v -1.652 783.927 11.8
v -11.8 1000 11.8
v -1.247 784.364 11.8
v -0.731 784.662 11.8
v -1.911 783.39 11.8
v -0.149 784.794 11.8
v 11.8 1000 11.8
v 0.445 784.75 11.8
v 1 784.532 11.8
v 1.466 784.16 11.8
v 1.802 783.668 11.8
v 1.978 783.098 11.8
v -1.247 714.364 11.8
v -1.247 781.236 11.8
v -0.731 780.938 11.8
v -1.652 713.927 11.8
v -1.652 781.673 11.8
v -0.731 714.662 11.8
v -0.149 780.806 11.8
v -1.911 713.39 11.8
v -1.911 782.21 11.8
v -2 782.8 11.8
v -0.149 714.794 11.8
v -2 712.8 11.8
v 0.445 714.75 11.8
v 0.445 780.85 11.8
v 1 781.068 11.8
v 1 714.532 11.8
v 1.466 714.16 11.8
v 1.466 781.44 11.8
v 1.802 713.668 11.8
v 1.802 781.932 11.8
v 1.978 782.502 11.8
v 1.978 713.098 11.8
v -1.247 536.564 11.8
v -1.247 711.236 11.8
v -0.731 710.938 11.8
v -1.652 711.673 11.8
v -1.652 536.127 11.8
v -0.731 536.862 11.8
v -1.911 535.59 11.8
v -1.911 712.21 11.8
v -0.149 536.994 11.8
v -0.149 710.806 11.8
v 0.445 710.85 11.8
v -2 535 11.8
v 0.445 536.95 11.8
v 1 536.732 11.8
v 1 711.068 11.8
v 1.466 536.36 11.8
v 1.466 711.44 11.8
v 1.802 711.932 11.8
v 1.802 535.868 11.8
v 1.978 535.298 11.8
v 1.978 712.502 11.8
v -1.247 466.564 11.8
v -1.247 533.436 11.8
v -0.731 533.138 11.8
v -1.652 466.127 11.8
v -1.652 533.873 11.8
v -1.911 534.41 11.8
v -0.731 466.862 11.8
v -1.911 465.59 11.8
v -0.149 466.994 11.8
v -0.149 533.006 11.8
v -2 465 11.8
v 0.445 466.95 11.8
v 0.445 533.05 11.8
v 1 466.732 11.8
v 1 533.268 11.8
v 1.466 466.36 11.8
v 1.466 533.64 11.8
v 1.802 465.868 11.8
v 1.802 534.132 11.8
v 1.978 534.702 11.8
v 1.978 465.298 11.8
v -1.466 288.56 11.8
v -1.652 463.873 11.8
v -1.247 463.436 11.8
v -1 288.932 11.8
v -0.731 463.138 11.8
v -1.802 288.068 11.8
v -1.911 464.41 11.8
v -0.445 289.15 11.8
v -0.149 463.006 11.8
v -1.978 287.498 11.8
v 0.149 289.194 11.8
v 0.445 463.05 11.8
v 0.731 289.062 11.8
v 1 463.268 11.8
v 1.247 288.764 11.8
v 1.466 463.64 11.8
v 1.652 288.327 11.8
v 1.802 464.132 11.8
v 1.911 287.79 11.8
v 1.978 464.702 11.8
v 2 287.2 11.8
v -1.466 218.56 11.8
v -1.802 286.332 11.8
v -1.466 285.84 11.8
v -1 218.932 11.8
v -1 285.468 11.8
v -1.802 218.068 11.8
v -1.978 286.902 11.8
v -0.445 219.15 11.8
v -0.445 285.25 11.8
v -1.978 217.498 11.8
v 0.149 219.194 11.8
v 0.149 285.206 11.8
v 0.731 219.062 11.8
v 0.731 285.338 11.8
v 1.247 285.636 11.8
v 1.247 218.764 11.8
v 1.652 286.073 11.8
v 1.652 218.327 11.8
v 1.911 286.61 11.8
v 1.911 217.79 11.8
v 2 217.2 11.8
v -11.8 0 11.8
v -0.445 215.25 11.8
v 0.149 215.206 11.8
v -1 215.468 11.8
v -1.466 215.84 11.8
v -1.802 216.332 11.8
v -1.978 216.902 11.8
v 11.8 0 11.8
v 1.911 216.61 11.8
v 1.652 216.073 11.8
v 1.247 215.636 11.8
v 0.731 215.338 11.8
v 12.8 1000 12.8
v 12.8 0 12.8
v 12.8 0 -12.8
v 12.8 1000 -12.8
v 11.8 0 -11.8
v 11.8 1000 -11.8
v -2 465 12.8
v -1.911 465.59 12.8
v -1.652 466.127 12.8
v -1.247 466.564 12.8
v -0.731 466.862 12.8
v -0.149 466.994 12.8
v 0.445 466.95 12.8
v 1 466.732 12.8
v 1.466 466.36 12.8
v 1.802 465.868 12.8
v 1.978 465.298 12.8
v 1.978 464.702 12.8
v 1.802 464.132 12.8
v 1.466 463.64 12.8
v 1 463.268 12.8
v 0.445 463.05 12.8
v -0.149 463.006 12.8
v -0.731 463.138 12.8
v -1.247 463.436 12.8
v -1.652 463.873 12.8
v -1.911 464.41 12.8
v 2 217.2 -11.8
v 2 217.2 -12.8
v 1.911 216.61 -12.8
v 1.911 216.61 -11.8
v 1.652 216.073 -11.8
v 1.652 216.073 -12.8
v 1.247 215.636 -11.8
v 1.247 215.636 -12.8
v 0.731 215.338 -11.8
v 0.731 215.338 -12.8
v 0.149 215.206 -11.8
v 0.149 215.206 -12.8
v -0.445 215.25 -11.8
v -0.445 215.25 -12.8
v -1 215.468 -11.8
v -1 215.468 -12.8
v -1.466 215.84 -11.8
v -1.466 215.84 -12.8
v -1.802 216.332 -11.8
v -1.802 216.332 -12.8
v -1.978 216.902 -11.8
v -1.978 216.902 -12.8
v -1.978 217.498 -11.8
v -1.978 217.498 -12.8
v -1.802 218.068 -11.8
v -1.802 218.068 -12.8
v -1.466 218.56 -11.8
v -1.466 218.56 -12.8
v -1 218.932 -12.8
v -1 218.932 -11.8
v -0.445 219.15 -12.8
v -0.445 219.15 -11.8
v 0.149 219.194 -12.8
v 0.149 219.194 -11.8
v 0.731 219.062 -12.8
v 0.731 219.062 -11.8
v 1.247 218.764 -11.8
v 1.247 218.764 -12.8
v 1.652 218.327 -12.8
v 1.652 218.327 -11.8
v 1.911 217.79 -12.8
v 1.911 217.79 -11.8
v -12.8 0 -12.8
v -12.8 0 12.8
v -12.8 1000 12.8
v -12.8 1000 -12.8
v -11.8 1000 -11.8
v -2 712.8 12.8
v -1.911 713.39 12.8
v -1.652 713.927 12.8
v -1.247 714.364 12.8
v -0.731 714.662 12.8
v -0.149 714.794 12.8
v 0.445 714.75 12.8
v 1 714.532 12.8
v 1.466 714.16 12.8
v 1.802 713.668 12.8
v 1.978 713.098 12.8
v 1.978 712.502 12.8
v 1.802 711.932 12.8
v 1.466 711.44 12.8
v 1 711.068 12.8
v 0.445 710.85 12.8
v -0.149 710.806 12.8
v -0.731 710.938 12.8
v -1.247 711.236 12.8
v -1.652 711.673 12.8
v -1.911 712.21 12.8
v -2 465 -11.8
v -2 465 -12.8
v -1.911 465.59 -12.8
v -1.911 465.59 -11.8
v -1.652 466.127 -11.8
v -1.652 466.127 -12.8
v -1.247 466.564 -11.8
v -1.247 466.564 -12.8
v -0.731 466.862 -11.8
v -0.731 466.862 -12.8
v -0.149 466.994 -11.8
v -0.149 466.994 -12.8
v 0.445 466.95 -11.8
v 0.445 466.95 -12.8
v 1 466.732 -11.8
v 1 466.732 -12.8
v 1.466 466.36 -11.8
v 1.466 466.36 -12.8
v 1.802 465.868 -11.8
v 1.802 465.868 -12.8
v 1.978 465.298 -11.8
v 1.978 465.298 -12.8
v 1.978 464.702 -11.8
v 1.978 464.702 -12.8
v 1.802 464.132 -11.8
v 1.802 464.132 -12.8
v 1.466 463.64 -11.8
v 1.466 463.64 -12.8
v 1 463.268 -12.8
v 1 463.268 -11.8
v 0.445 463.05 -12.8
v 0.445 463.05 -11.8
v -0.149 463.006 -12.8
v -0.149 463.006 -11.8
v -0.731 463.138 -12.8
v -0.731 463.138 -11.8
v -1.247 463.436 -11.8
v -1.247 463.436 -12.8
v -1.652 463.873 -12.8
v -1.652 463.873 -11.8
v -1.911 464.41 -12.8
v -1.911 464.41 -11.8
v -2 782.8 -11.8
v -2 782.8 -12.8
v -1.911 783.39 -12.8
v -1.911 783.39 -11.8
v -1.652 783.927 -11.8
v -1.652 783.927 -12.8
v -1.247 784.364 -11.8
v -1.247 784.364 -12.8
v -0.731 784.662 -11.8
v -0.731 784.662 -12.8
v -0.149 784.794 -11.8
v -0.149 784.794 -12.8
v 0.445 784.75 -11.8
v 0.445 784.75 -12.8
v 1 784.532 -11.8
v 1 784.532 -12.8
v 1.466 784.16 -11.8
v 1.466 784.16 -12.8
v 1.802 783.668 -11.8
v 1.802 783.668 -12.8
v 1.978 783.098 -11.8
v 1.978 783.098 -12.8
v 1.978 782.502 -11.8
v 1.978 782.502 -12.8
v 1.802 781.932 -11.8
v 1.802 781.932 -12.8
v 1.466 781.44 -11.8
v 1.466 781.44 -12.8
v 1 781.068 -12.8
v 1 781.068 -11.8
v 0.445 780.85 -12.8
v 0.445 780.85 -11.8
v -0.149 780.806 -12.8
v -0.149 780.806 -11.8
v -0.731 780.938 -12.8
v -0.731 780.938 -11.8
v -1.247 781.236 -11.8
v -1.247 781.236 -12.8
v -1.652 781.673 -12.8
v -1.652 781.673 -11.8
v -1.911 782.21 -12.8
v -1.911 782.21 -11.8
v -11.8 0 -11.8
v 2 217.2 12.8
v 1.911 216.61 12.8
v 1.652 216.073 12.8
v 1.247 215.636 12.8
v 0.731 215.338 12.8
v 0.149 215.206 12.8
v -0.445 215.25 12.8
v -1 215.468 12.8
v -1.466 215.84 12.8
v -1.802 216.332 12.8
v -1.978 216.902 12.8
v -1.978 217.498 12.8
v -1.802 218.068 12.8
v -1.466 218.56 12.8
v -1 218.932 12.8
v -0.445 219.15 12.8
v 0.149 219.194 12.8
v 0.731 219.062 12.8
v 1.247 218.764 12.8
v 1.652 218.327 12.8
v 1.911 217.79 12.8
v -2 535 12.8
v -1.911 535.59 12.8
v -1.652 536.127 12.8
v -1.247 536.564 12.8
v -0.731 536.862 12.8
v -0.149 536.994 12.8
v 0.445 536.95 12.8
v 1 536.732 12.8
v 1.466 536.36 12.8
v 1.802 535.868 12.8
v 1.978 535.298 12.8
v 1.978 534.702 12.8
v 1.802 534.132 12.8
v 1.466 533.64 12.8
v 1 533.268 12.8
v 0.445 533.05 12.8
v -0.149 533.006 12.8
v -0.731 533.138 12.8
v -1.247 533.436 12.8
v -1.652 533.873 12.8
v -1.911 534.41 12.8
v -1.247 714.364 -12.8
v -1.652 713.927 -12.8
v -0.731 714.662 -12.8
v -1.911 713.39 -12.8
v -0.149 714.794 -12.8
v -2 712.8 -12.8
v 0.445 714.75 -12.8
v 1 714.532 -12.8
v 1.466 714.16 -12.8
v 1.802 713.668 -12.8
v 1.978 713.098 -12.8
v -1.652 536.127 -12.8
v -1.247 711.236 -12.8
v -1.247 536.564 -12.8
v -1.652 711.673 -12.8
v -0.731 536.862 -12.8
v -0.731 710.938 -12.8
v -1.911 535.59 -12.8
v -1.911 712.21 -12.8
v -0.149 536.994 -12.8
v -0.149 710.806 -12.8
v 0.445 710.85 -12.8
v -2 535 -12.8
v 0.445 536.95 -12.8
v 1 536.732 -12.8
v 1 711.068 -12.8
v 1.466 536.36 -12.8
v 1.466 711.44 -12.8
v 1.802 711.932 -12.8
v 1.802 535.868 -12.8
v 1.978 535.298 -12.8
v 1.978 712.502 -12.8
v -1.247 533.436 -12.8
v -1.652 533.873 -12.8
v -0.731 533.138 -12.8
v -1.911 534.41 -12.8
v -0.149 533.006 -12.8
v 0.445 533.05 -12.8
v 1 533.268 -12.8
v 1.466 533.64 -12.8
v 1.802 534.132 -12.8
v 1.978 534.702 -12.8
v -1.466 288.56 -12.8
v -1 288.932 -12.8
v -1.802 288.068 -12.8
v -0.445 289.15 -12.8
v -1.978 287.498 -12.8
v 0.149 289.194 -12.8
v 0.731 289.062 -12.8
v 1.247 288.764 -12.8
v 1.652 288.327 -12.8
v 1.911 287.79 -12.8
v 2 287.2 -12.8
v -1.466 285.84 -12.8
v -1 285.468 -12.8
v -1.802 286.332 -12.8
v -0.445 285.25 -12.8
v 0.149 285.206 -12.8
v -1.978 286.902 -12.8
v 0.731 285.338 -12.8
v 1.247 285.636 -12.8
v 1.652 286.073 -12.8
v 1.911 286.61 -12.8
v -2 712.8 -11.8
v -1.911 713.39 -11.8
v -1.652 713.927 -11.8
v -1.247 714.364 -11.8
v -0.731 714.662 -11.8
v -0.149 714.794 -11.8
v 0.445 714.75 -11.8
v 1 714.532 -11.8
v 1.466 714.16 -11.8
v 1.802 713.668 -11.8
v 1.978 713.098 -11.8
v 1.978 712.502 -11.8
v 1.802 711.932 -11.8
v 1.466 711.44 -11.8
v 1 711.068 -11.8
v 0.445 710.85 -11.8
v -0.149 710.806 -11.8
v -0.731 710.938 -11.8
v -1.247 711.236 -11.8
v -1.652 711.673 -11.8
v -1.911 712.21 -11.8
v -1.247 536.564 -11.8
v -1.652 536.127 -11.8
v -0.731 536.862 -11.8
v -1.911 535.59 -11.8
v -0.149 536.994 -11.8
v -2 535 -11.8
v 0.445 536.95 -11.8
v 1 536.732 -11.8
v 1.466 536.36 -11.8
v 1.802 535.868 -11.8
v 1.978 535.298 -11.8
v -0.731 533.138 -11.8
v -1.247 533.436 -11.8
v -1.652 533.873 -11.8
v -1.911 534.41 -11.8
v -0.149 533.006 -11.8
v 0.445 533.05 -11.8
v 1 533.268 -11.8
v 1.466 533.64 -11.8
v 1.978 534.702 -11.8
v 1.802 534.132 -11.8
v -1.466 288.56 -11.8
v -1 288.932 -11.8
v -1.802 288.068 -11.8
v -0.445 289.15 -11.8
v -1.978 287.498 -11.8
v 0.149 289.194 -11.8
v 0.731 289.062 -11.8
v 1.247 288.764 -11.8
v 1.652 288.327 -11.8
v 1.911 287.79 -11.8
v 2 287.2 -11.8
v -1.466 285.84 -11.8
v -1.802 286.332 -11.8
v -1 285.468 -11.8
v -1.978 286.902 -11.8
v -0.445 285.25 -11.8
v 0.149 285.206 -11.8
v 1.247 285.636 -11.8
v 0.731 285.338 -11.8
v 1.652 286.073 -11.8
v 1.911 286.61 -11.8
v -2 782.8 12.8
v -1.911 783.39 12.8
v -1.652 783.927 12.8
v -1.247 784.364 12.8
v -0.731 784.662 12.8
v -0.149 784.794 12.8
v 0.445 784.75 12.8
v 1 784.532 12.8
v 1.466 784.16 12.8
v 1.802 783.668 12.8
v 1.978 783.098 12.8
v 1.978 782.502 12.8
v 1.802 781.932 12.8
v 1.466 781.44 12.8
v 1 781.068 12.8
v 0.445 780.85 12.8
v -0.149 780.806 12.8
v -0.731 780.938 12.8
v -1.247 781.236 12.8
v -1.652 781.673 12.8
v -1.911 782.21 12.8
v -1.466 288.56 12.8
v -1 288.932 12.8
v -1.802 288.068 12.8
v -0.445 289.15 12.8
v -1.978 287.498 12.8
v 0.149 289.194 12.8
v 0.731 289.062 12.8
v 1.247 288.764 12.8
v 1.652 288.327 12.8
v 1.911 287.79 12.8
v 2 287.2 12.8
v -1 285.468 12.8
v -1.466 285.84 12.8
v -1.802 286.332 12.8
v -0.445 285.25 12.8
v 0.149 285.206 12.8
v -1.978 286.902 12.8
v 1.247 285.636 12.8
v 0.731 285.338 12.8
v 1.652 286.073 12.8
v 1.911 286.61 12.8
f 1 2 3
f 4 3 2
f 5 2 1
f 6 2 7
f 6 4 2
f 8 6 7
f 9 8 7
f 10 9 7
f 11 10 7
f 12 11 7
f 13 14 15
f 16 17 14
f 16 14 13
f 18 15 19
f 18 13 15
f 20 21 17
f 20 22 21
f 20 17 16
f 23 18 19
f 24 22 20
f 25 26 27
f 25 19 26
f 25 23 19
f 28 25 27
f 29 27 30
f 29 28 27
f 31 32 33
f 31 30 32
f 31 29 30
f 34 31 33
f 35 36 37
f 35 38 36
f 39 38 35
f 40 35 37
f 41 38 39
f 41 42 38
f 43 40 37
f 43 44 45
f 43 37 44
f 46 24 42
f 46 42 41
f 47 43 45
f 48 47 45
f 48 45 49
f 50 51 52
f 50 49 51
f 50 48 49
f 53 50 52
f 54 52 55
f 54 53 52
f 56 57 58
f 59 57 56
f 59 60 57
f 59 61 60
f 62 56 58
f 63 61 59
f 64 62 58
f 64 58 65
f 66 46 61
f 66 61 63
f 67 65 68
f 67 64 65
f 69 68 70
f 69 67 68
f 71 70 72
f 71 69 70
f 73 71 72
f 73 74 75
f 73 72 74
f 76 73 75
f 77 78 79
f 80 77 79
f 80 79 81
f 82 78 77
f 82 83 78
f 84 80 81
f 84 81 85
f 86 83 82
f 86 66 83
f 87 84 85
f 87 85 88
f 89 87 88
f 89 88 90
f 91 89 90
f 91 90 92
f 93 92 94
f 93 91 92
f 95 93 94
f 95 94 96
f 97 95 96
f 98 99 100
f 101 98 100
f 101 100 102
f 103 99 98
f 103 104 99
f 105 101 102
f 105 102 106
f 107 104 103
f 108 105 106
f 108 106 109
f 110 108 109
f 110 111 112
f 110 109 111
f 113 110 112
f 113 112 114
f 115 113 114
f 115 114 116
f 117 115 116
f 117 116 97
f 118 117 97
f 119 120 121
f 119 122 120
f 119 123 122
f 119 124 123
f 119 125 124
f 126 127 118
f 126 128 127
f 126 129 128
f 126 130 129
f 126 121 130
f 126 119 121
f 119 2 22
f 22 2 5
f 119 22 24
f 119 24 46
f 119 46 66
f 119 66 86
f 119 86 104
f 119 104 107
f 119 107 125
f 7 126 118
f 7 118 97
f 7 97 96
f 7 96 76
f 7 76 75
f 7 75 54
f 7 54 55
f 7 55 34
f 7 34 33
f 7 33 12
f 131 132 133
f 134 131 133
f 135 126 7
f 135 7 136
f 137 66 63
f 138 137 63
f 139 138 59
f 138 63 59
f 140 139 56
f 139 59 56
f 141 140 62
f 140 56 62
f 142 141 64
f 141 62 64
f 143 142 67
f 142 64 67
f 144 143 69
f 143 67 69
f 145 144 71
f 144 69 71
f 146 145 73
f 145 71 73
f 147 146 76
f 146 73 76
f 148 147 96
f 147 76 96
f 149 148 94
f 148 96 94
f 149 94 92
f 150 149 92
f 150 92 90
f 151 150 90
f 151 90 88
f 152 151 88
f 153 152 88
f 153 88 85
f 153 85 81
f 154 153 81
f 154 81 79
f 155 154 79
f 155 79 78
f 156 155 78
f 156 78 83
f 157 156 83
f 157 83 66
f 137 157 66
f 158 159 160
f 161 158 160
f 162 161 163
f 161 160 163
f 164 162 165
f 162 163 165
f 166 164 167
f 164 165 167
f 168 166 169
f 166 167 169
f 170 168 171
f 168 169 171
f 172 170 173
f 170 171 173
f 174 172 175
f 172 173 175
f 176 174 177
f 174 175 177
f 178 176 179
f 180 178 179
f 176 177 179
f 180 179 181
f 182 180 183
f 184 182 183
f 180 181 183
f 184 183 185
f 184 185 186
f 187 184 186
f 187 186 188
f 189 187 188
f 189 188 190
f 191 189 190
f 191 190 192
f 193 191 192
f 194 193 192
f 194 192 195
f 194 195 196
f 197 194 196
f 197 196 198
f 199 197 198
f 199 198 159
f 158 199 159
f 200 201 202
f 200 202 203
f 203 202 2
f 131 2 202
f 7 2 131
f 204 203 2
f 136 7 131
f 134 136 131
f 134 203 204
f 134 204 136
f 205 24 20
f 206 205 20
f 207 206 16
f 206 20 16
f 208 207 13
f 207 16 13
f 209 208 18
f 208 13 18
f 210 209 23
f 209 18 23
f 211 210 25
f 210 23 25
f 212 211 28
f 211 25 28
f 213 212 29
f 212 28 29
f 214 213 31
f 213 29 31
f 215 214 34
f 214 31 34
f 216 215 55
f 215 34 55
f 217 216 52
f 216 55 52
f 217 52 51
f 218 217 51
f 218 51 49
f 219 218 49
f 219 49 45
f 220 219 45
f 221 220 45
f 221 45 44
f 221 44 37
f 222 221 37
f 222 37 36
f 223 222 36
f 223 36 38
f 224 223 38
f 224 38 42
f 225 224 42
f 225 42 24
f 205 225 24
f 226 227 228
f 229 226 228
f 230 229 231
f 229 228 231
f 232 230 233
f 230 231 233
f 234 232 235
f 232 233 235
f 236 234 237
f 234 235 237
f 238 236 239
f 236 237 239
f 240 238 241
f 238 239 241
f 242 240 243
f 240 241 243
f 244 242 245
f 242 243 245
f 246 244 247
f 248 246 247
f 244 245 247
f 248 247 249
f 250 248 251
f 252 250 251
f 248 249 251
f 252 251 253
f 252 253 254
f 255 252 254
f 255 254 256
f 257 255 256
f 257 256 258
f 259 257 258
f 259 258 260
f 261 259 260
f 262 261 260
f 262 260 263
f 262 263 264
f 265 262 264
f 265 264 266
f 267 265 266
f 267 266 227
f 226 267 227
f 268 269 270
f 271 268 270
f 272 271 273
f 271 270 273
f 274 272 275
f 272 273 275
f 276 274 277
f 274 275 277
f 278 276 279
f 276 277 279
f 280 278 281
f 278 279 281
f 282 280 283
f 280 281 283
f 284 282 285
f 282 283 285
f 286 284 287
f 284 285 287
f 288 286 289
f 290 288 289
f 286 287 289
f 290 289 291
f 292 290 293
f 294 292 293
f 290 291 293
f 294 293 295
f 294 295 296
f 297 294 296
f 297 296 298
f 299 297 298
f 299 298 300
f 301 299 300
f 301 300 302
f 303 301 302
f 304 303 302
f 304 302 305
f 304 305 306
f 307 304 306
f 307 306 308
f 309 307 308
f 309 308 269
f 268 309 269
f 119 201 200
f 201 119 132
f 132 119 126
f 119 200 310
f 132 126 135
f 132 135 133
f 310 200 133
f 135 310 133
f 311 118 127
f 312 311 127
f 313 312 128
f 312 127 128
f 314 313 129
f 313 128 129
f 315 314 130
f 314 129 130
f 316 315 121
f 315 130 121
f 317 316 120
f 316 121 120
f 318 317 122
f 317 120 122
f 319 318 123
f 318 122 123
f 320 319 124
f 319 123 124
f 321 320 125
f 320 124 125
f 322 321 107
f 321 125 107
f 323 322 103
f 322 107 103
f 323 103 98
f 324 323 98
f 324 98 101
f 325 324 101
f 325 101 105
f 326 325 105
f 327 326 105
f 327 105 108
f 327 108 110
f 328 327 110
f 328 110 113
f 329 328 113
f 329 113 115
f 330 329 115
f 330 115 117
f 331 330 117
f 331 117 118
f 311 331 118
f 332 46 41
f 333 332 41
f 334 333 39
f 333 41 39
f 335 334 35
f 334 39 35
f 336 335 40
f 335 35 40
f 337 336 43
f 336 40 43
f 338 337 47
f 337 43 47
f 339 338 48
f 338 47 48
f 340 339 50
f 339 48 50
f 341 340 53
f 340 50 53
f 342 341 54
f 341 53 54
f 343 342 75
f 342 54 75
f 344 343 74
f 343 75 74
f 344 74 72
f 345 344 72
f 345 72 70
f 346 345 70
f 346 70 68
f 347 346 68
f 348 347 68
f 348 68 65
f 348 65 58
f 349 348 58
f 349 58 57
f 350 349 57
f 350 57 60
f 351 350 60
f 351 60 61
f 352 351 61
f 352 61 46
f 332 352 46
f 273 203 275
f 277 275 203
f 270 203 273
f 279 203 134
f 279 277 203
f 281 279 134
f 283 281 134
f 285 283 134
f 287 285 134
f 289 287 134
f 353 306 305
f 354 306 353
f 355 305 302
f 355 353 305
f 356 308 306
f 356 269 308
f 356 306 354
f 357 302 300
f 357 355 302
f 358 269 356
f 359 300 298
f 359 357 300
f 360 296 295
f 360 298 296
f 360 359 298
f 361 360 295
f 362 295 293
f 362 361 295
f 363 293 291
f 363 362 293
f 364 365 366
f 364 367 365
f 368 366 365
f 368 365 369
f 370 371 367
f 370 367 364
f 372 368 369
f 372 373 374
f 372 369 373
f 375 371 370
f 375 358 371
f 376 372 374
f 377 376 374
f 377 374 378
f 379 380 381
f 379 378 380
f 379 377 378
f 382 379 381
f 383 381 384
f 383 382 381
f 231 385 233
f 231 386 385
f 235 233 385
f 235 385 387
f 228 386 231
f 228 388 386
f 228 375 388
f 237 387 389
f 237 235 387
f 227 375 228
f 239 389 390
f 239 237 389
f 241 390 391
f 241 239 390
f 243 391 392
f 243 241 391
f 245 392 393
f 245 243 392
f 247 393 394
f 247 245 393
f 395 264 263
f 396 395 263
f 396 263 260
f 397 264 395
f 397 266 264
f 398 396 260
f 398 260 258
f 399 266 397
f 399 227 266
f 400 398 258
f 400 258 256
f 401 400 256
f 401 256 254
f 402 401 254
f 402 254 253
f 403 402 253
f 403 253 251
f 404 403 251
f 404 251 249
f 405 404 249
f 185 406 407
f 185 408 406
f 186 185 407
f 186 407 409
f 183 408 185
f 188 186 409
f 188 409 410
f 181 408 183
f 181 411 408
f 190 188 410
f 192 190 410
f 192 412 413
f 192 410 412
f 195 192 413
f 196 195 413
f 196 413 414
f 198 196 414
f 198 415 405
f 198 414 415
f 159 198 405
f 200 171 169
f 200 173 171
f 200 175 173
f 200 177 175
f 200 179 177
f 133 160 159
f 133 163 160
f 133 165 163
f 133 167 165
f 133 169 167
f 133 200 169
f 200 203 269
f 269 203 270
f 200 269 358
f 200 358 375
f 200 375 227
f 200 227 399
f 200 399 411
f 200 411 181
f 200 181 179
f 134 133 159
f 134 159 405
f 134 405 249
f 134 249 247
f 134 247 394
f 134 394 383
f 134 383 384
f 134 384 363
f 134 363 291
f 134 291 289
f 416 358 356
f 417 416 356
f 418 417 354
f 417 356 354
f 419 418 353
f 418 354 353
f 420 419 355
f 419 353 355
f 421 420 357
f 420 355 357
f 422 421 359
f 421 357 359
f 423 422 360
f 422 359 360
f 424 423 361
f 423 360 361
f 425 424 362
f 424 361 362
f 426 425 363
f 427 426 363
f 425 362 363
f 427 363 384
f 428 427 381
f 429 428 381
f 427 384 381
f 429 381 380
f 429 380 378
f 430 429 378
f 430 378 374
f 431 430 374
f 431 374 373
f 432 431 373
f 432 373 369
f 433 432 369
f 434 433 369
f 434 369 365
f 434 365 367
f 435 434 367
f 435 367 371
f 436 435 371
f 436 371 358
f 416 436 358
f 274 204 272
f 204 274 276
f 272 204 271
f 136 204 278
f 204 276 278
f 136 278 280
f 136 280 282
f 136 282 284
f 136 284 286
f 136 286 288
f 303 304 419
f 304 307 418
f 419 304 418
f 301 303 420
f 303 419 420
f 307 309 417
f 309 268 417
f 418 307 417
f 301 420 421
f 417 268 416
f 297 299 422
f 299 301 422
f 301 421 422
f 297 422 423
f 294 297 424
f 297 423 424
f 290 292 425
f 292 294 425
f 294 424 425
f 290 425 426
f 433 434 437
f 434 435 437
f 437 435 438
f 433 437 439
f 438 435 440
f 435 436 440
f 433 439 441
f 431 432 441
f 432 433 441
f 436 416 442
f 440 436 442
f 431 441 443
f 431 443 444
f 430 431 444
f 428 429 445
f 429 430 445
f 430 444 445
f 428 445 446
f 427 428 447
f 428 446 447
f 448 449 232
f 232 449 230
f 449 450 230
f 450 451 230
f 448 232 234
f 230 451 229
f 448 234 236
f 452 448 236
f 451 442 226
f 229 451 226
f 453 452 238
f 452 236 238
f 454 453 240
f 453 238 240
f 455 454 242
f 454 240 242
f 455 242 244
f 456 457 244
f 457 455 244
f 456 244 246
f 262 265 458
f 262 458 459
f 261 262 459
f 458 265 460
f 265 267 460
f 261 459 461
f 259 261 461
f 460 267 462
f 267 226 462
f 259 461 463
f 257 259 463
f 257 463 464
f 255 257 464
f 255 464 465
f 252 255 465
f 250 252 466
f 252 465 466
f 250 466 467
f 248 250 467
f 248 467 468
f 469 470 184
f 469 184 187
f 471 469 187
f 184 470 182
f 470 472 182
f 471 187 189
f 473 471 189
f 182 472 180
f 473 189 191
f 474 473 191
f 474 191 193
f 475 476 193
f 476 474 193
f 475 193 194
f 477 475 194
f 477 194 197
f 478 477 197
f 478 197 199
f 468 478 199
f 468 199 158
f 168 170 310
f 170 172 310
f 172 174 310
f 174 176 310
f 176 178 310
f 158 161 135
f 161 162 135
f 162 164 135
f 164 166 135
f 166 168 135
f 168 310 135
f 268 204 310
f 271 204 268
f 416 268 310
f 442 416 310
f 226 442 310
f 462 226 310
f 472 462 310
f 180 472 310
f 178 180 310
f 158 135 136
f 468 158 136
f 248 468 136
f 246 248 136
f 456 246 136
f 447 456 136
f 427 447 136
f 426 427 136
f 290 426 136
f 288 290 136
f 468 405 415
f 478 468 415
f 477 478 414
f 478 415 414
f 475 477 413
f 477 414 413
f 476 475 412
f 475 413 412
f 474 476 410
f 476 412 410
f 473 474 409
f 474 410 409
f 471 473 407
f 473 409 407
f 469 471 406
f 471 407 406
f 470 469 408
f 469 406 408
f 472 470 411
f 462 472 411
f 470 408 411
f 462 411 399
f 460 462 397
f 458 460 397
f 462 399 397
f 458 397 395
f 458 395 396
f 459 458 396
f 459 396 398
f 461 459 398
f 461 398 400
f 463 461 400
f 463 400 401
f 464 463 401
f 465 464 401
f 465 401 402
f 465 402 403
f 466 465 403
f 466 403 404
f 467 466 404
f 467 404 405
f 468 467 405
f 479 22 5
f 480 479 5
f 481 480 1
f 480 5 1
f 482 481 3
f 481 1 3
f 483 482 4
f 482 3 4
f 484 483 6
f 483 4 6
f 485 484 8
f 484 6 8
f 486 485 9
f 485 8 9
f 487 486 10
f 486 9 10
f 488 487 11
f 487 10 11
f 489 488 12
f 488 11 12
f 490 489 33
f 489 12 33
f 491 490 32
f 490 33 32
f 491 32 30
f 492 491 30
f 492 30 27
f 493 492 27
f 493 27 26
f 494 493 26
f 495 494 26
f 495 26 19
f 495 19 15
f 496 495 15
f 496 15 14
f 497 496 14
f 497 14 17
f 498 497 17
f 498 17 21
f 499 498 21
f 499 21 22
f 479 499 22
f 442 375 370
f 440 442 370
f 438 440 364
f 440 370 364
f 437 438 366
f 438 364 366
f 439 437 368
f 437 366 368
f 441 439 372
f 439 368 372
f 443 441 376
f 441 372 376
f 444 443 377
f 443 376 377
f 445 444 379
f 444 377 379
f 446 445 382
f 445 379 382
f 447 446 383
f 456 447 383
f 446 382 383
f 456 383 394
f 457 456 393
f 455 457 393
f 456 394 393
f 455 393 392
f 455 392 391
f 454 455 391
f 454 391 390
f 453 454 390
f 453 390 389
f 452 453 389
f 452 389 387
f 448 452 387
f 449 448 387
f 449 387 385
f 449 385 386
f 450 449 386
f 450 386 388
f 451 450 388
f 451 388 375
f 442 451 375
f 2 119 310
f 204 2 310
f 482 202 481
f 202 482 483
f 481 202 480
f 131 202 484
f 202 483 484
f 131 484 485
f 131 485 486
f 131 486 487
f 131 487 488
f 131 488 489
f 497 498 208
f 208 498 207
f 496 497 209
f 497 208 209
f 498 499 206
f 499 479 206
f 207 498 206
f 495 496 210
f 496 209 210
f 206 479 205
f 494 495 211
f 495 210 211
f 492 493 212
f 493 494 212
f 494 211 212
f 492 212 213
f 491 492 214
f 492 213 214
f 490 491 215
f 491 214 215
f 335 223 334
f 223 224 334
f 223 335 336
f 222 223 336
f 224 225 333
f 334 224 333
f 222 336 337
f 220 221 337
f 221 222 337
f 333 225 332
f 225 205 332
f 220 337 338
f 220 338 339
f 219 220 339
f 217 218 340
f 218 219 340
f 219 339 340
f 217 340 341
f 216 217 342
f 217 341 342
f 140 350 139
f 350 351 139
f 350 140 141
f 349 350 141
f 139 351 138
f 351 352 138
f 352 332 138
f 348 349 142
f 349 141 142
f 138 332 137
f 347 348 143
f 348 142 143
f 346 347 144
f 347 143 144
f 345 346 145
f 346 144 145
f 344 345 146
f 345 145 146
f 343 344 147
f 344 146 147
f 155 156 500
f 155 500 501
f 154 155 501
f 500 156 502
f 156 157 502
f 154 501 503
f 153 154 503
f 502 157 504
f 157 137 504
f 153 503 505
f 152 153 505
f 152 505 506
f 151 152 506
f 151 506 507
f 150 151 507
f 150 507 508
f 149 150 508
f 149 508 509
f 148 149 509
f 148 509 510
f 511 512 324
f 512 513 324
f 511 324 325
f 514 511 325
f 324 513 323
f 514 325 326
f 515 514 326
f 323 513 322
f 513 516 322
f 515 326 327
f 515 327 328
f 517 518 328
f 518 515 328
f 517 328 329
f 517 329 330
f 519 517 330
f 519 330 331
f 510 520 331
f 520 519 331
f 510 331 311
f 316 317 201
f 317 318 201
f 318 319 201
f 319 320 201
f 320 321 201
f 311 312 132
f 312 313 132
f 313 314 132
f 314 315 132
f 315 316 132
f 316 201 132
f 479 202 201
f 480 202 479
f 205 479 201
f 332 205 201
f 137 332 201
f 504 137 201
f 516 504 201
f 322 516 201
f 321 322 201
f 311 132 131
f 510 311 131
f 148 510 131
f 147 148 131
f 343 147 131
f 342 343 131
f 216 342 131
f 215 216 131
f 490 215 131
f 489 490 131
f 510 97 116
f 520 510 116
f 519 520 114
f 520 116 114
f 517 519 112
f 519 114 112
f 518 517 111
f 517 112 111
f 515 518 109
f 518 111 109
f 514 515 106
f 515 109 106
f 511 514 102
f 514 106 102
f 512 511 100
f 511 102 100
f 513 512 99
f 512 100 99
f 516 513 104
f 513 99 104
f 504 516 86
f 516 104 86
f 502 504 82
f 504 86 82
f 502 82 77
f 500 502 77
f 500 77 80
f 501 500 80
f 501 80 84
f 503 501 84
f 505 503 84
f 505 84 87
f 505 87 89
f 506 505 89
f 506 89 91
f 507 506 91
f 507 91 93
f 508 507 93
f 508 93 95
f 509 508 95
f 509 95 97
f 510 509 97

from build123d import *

# Parameters (mm, degrees)
SKETCH1_W           = 25.6
SKETCH1_H           = 25.6
SKETCH1_W_2         = 23.6
SKETCH1_H_2         = 23.6
BOSS_EXTRUDE1_DEPTH = 1000
SKETCH2_R           = 2
CUT_EXTRUDE1_DEPTH  = 33


with BuildPart() as part:
    # Sketch1 → Boss-Extrude1 (new body)
    with BuildSketch(Plane(origin=(0, 0, 0), x_dir=(1, 0, 0), z_dir=(0, 1, 0))):
        Rectangle(SKETCH1_W, SKETCH1_H)
        Rectangle(SKETCH1_W_2, SKETCH1_H_2, mode=Mode.SUBTRACT)
    extrude(amount=BOSS_EXTRUDE1_DEPTH)

    # Sketch2 → Cut-Extrude1 (cut)
    with BuildSketch(Plane(origin=(0, 0, -12.8), x_dir=(-1, 0, 0), z_dir=(0, 0, -1))):
        with Locations((0, 535)):
            Circle(SKETCH2_R)
        with Locations((0, 465)):
            Circle(SKETCH2_R)
        with Locations((0, 782.8)):
            Circle(SKETCH2_R)
        with Locations((0, 712.8)):
            Circle(SKETCH2_R)
        with Locations(Location((0, 287.2, 0), (0, 0, 180))):
            Circle(SKETCH2_R)
        with Locations(Location((0, 217.2, 0), (0, 0, 180))):
            Circle(SKETCH2_R)
    extrude(amount=-CUT_EXTRUDE1_DEPTH, mode=Mode.SUBTRACT)


solid = part.part
